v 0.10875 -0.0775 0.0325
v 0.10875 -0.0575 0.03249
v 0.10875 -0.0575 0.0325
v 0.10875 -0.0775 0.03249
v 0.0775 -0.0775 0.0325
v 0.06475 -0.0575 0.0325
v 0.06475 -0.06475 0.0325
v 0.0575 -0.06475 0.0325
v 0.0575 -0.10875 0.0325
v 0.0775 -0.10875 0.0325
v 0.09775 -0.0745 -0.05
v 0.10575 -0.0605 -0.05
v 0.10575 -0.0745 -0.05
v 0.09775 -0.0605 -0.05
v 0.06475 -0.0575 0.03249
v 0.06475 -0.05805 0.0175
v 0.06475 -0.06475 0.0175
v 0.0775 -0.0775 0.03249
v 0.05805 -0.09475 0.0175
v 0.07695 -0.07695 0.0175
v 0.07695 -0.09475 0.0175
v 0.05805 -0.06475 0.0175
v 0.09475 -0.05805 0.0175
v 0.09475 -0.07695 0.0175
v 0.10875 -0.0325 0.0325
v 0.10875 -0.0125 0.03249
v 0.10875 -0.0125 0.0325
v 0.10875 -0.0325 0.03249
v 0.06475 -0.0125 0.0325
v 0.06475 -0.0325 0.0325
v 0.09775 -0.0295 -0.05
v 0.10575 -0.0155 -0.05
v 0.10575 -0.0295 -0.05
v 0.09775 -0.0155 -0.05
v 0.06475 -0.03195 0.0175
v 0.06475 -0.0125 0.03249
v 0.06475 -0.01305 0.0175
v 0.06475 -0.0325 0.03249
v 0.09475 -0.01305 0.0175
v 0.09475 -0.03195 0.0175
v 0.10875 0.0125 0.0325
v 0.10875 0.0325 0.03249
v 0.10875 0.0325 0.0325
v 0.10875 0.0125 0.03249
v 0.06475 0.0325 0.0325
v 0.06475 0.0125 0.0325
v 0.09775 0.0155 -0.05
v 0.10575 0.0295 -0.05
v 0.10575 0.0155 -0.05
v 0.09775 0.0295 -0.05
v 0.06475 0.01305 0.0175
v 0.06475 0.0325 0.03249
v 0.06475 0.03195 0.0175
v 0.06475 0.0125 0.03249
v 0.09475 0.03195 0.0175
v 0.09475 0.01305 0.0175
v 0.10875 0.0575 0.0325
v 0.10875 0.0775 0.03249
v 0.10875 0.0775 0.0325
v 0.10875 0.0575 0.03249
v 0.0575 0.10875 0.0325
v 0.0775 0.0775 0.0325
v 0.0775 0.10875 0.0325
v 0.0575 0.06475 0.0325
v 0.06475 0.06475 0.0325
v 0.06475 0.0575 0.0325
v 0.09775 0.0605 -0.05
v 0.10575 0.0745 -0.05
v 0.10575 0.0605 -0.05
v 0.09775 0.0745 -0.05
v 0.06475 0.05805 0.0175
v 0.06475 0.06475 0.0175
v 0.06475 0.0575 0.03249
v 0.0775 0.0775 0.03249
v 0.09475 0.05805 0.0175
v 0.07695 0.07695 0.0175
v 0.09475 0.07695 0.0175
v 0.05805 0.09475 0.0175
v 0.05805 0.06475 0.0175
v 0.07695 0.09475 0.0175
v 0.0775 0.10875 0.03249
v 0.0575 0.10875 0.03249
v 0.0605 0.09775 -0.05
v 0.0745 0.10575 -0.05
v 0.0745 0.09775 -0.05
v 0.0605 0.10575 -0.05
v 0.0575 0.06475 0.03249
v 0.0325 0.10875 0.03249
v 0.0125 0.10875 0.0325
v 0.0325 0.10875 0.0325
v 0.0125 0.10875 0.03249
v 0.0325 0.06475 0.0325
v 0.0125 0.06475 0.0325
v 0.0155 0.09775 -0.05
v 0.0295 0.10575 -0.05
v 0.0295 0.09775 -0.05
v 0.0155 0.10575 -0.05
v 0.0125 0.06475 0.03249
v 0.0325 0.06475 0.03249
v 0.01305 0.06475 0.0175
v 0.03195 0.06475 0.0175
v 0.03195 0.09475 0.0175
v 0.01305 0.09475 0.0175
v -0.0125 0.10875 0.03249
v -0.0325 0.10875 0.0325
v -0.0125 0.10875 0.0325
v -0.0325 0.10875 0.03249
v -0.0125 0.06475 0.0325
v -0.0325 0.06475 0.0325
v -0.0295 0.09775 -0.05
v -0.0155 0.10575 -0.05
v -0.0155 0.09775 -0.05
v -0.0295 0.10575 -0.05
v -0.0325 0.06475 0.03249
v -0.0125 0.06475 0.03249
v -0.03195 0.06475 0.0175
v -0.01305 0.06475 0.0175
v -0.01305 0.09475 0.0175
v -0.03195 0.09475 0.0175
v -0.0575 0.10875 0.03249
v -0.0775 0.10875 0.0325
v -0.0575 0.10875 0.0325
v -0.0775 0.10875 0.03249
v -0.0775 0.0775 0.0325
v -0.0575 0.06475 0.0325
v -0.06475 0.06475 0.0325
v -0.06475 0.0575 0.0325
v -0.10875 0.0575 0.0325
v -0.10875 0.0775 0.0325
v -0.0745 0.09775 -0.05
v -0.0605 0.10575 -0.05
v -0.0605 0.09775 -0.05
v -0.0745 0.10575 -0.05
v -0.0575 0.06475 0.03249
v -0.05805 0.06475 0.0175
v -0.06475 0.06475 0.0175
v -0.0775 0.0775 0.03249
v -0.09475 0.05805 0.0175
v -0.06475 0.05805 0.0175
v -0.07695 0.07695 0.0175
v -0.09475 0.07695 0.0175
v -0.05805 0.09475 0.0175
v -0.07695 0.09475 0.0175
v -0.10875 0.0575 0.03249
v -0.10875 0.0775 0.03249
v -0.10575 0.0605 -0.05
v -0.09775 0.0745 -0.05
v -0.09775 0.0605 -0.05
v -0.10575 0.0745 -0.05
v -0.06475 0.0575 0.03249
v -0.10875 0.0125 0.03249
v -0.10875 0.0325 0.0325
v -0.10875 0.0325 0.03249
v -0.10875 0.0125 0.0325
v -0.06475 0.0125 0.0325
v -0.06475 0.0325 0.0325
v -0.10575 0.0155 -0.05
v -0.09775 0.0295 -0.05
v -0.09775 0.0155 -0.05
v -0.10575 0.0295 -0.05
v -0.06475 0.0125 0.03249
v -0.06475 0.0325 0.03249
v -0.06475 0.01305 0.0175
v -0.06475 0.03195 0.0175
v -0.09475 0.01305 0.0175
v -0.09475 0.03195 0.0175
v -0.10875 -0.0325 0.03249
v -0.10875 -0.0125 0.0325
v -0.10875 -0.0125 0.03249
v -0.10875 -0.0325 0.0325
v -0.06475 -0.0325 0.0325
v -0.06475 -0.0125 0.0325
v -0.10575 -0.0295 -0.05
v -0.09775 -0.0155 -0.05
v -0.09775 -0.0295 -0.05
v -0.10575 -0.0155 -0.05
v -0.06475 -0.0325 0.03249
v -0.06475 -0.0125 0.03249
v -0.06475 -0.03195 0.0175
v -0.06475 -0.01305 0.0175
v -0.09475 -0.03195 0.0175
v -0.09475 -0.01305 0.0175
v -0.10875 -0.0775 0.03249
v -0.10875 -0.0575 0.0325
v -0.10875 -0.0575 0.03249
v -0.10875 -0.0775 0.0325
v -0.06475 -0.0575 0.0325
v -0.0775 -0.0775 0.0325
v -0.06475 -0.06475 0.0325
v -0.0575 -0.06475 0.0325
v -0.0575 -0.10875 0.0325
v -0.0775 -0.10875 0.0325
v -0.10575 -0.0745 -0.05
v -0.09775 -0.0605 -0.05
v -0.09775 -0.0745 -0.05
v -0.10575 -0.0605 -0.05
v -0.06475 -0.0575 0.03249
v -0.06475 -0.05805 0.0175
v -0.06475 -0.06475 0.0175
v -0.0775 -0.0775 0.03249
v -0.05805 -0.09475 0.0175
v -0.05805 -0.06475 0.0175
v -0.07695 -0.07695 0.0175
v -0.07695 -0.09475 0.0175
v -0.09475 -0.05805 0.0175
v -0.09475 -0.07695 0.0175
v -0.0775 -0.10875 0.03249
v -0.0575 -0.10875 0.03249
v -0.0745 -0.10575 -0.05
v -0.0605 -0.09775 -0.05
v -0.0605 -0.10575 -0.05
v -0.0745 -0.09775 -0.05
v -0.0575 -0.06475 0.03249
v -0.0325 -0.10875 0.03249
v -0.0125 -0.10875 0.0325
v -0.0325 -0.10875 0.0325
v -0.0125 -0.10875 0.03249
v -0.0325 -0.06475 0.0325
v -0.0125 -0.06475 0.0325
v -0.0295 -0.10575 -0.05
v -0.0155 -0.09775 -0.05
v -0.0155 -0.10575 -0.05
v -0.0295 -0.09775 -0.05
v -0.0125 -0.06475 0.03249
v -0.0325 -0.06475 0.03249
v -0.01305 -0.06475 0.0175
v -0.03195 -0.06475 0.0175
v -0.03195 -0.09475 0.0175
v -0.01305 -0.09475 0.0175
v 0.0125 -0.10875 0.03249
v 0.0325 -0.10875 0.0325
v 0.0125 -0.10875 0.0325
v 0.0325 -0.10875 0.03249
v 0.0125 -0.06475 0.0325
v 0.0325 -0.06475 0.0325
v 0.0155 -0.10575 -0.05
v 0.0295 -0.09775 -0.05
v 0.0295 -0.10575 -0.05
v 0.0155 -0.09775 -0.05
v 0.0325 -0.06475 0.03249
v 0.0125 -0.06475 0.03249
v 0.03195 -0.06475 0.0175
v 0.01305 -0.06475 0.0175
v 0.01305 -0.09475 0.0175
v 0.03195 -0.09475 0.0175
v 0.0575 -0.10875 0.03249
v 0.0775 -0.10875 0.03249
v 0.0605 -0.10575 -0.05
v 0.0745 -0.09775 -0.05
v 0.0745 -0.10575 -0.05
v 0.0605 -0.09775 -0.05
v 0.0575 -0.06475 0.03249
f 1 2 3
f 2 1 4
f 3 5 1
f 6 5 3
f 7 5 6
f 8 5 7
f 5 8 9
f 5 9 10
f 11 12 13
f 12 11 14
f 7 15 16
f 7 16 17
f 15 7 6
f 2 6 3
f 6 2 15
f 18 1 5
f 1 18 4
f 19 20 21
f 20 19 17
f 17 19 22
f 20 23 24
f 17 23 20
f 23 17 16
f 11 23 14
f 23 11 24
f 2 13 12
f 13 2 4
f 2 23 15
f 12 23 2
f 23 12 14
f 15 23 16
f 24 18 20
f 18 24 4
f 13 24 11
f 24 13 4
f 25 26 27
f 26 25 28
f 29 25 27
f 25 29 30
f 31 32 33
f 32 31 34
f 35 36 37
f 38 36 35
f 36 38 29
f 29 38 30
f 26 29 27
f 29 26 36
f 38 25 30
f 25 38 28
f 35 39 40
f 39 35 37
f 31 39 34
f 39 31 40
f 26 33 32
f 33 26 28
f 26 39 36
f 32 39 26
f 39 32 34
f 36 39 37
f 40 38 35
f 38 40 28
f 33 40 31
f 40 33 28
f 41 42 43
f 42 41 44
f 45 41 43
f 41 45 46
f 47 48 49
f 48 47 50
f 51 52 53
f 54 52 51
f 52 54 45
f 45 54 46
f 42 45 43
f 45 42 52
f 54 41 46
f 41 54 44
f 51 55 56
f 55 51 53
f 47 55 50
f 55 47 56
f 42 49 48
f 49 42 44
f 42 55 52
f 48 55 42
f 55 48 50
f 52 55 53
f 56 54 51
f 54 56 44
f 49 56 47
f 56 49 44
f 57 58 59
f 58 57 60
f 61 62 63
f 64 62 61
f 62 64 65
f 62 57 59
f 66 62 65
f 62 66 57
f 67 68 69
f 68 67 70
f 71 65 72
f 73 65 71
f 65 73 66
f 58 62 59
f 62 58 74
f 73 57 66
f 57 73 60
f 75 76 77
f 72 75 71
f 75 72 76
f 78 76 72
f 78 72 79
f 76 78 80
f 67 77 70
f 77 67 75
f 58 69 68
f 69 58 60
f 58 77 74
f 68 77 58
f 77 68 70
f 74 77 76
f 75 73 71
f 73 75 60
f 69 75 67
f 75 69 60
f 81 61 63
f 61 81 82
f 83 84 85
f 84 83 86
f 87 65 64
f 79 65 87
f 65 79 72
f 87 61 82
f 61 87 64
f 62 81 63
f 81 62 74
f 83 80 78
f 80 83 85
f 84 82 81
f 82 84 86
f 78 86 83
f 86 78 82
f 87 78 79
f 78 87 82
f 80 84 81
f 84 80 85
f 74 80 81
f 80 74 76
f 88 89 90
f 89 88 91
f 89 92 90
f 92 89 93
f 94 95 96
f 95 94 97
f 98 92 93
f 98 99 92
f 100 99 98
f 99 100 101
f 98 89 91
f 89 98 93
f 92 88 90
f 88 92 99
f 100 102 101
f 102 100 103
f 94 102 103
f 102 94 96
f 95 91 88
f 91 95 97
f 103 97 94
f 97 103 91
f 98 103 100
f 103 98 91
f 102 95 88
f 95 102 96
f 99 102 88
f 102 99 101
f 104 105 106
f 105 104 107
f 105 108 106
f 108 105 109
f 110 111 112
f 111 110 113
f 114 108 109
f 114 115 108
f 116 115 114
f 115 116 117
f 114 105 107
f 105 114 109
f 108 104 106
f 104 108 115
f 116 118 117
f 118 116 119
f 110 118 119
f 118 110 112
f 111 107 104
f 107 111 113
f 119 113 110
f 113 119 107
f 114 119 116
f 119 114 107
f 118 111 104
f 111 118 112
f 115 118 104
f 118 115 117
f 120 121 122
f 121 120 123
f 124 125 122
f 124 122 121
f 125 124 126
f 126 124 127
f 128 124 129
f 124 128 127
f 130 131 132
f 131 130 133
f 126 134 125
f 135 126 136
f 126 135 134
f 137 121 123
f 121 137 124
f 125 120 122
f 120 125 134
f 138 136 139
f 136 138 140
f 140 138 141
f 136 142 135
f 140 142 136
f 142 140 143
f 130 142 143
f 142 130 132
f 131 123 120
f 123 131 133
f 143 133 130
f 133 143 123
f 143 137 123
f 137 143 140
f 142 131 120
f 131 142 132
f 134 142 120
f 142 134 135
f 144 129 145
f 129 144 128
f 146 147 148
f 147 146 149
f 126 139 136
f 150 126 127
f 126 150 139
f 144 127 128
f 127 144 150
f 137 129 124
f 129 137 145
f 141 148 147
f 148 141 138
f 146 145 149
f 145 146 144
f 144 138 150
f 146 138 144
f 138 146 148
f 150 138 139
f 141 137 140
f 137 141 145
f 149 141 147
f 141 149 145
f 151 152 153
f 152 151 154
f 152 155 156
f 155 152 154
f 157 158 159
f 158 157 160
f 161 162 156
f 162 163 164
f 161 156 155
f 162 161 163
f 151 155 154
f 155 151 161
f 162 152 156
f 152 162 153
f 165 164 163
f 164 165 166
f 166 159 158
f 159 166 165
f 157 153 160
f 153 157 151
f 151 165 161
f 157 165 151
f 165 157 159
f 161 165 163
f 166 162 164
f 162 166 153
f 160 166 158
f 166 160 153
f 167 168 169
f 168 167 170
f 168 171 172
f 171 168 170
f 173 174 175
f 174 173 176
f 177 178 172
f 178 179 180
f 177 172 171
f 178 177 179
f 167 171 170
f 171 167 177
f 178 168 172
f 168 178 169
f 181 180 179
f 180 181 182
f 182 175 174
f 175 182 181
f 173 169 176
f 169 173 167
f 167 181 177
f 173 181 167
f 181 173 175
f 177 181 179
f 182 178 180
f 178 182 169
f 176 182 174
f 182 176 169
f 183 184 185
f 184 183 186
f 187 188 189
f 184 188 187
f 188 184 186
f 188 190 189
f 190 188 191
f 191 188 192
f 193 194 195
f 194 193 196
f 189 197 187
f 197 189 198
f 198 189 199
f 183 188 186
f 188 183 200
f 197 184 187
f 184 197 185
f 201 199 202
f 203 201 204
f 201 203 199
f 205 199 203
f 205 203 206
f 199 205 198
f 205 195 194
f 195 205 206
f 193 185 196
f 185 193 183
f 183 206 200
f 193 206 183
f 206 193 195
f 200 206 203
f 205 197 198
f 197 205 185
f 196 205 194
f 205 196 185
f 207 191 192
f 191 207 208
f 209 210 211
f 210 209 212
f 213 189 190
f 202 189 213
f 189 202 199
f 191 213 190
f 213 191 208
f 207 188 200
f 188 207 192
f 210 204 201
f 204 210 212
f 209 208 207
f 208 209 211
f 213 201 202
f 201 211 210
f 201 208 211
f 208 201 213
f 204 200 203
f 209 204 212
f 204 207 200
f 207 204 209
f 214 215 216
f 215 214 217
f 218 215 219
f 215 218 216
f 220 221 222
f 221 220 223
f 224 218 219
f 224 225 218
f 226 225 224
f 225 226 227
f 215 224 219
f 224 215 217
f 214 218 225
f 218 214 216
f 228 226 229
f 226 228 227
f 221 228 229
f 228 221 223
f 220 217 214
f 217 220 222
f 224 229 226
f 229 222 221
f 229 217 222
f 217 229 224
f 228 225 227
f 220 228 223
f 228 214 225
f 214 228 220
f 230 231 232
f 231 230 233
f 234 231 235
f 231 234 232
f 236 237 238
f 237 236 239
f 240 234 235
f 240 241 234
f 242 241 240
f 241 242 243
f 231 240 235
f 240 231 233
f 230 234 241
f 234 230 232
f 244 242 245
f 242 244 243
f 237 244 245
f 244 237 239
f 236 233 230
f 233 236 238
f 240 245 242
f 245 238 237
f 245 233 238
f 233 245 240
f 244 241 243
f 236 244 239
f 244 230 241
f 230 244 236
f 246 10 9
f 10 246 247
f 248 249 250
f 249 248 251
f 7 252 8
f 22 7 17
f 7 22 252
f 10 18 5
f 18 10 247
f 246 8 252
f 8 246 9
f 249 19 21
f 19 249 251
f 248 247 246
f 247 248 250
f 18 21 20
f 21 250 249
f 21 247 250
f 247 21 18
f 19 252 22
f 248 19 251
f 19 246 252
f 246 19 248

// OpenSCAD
// file: DataSymbol.scad
boxSize = 0.029;
lineSize = 0.0045;
symDepth = 0.01;
vertSeparation = 0.019;
horizSeparation = 0.018;

module DataSymbol() {
  boxVertCenter = (boxSize+vertSeparation)/2;
  boxHorizCenter = (boxSize+horizSeparation)/2;
  linear_extrude(symDepth, center=true) {
    translate([0,boxVertCenter]) square(boxSize, center=true); // top box
    translate([-boxHorizCenter,-boxVertCenter]) square(boxSize, center=true); // bottom left box
    translate([boxHorizCenter,-boxVertCenter]) square(boxSize, center=true); // bottom right box
    square([2*boxHorizCenter + lineSize, lineSize], center=true); // middle line
    translate([0, horizSeparation/4]) square([lineSize, horizSeparation/2 + lineSize], center=true); // line to top
    translate([-boxHorizCenter, -horizSeparation/4]) square([lineSize, horizSeparation/2 + lineSize], center=true); // line to bottom left
    translate([boxHorizCenter, -horizSeparation/4]) square([lineSize, horizSeparation/2 + lineSize], center=true); // line to bottom right
  }
}

DataSymbol();
// file: PowerSymbol.scad
symWidth = 0.038;
symHeight = 0.086;
symDepth = 0.01;
middleHeight = 0.0075;
topHorizOffset = 0.007;
sideVertOffset = 0.007;

module PowerSymbol() {
  linear_extrude(symDepth, center=true) {
    halfHei = symHeight/2;
    halfWid = symWidth/2;
    halfMid = middleHeight/2;
    polygon([
      [topHorizOffset, halfHei],
      [0, halfMid],
      [halfWid, sideVertOffset],
      [-topHorizOffset, -halfHei],
      [0, -halfMid],
      [-halfWid, -sideVertOffset]
    ]);
  }
}

PowerSymbol();
// file: BasicFPGAHousing_paintcap.scad
include <FPGA_shared.scad>;
use <BasicFPGAHousing_base.scad>;

module BasicFPGAHousing_paintcap() {
  bevelDepth = capBevel * sqrt(2);
  difference() {
    translate([0,0,baseTop]) {
      cube(size=[capSize, capSize, capDepth*2], center=true);
    }
    cube(size=[slotSize+eps, slotSize+eps, smallGridSize], center=true);
    for (edge=[1:4]) rotate([0,0,90*edge]) {
      translate([0,capSize/2,baseTop+capDepth]) rotate([45,0,0])
        cube(size=[capSize+0.1, bevelDepth, bevelDepth*2], center=true);
    }
  }
}

%BasicFPGAHousing_base();
BasicFPGAHousing_paintcap();
// file: BasicFPGAHousing_base.scad
include <FPGA_shared.scad>;
use <BasicFPGAHousing_paintcap.scad>;
use <PowerSymbol.scad>;
use <DataSymbol.scad>;

module BasiFPGAHousing_chipcutout() {
  slotPinBaseOffset = (-slotPinEdgeCount-1)/2 * slotPinEdgeSpacing;
  slotPinEdgeOffset = slotSize/2 - slotPinSize/2 - slotPinEdgePad;
  union() {
    translate([0, 0, baseDepth/2 + slotBottom + slotPinDepth]) {
      cube(size=[slotSize, slotSize, baseDepth], center=true);
    }
    for(edge=[1:4]) rotate([0,0,90*edge]) {
      for(i=[1:slotPinEdgeCount]) {
        translate([
          slotPinBaseOffset + slotPinEdgeSpacing*i,
          slotPinEdgeOffset,
          slotBottom + slotPinDepth
        ]) {
          cube(size=[slotPinSize, slotPinSize, slotPinDepth*2], center=true);
        }
      }
    }
    translate([alignHoleOffset,alignHoleOffset,slotBottom + slotPinDepth])
      cylinder(h=alignHoleDepth*2, r=alignHoleRadius, center=true, $fn=alignHoleSides);
  }
}

module BasicFPGAHousing_base() {
  middleSize = (slotSize + capSize) / 2;
  difference() {
    union() {
      translate([0,0,baseCenter])
        cube(size=[baseSize, baseSize, baseDepth], center=true);
      translate([0,0,baseTop-eps])
        cube(size=[middleSize, middleSize, capDepth*2], center=true);
    }
    translate([0,0,baseBottom])
      cube(size=[baseBackCutoutSize, baseBackCutoutSize, baseBackCutoutDepth*2], center=true);
    BasiFPGAHousing_chipcutout();
    cablecutout();
    rotate([0,0,180]) cablecutout();
  }
}

BasicFPGAHousing_base();
%BasicFPGAHousing_paintcap();
%translate([0.067,0.25,-0.001]) rotate([-90, 0, 0]) PowerSymbol();
%translate([0.073,-0.25,0.001]) rotate([90, 0, 0]) DataSymbol();
// file: BasicFPGAHousing_full.scad
use <BasicFPGAHousing_base.scad>;
use <BasicFPGAHousing_paintcap.scad>;
use <PowerSymbol.scad>;
use <DataSymbol.scad>;

module BasicFPGAHousing_full() {
  BasicFPGAHousing_base();
  BasicFPGAHousing_paintcap();
  translate([0.067,0.25,-0.001]) rotate([-90, 0, 0]) PowerSymbol();
  translate([0.073,-0.25,0.001]) rotate([90, 0, 0]) DataSymbol();
}

BasicFPGAHousing_full();
// file: BasicFPGAChip_base.scad
include <FPGA_shared.scad>;
use <BasicFPGAHousing_full.scad>;
use <BasicFPGAChip_pins.scad>;

module BasicFPGAChip_base() {
  bevelHeight = (chipBaseHeight - pinHorizHeight)/2;
  bevelAngle = atan2(chipBaseBevelSize, bevelHeight);
  translate([0, 0, chipTotalHeight/2 - chipBaseHeight/2]) difference() {
    cube(size=[chipBaseSize, chipBaseSize, chipBaseHeight], center=true);
    for (side=[0:3]) rotate([0,0,90*side])
      for (vside = [-1:2:1])
        translate([0,chipBaseSize/2,vside*pinHorizHeight/2])
          rotate([vside*bevelAngle,0,0])
          translate([0,chipBaseBevelSize,0])
            cube(size=[chipBaseSize*2,chipBaseBevelSize*2,bevelHeight*4], center=true);
    translate([alignHoleOffset,alignHoleOffset,chipBaseHeight/2])
      cylinder(h=alignHoleDepth*2, r=alignHoleRadius, center=true, $fn=alignHoleSides);
  }
}

BasicFPGAChip_base();
%BasicFPGAChip_pins();
*%translate([0,0,-slotBottom-chipTotalHeight/2]) BasicFPGAHousing_full();
// file: FPGA_shared.scad
smallGridSize = 0.5;
baseSize = smallGridSize;
baseTop = 0.05;
baseBottom = -0.045;
baseDepth = baseTop - baseBottom;
baseCenter = (baseTop + baseBottom)/2;
baseBackRim = 0.02;
baseBackCutoutSize = baseSize - baseBackRim*2;
baseBackCutoutDepth = 0.01;
capSize = 0.41;
capDepth = 0.045;
capBevel = 0.01;
slotSize = smallGridSize * 0.5;
slotBottom = 0.03;
slotPinEdgeCount = 4;
slotPinEdgePad = 0.01;
slotPinEdgeSpacing = 0.045;
slotPinSize = 0.025;
slotPinDepth = 0.025;
eps = 0.00001;
chipTotalSize = slotSize - slotPinEdgePad*2 - slotPinSize/2;
chipTotalHeight = 0.1;
chipBaseHeight = 0.05;
pinHorizLength = 0.022;
pinHorizUnderLength = 0.008;
pinHorizWidth = 0.02;
pinHorizHeight = 0.015;
pinVertInnerOffset = 0.003;
pinVertOuterOffset = 0.003;
pinVertNarrowOffset = 0.003;
pinTotalHeight = chipTotalHeight - chipBaseHeight/2 + pinHorizHeight/2;
chipBaseSize = chipTotalSize - pinHorizLength*2;
chipBaseBevelSize = 0.005;
alignHoleRadius = 0.005;
alignHoleOffset = chipBaseSize/2 - 0.02;
alignHoleDepth = 0.005;
alignHoleSides = 8;

module cablecutout() {
  cableradius = 0.025;
  cableDepth = 0.0125;
  translate([0,smallGridSize/2,0]) rotate([90,0,0]) {
    cylinder(h=cableDepth*2, r=cableradius, center=true, $fn=8);
  }
}
// main file
include <FPGA_shared.scad>;
use <BasicFPGAChip_base.scad>;

module FPGAPin() {
  pinTop = chipTotalHeight/2 - chipBaseHeight/2 + pinHorizHeight/2;
  pinVCenter = pinTop - pinTotalHeight/2;
  pinBottomInnerEdge = pinHorizUnderLength + pinVertInnerOffset;
  pinInnerHeight = pinTotalHeight - pinHorizHeight;
  pinInnerAngle = atan2(-pinVertInnerOffset, pinInnerHeight);
  pinInnerCutoutHeight = pinInnerHeight / cos(pinInnerAngle);
  pinBottomOuterEdge = pinHorizLength - pinVertOuterOffset;
  pinOuterAngle = atan2(pinVertOuterOffset, pinTotalHeight);
  pinBottomNarrowEdge = pinHorizWidth/2 - pinVertNarrowOffset;
  pinNarrowAngle = atan2(pinVertNarrowOffset, pinTotalHeight);
  translate([0,0,pinVCenter]) difference() {
    translate([0, 0, 0])
      cube(size=[pinHorizLength*2, pinHorizWidth, pinTotalHeight], center=true);
    translate([pinHorizUnderLength-pinHorizLength, 0, -pinHorizHeight])
      cube(size=[pinHorizLength*2, pinHorizWidth*2, pinTotalHeight], center=true);
    translate([pinBottomInnerEdge,0,-pinHorizHeight/2-pinInnerHeight/2])
      rotate([0,pinInnerAngle,0])
      translate([-pinVertInnerOffset,0,0])
        cube(size=[pinVertInnerOffset*2, pinHorizWidth*2, pinInnerCutoutHeight*2], center=true);
    translate([pinBottomOuterEdge,0,-pinTotalHeight/2])
      rotate([0,pinOuterAngle,0])
      translate([pinVertOuterOffset,0,0])
        cube(size=[pinVertOuterOffset*2, pinHorizWidth*2, pinTotalHeight*4], center=true);
    translate([0,pinBottomNarrowEdge,-pinTotalHeight/2])
      rotate([-pinNarrowAngle,0,0])
      translate([0,pinVertNarrowOffset,0])
        cube(size=[pinHorizLength*4,pinVertNarrowOffset*2, pinTotalHeight*4], center=true);
    translate([0,-pinBottomNarrowEdge,-pinTotalHeight/2])
      rotate([pinNarrowAngle,0,0])
      translate([0,-pinVertNarrowOffset,0])
        cube(size=[pinHorizLength*4,pinVertNarrowOffset*2, pinTotalHeight*4], center=true);
  }
}

module BasicFPGAChip_pins() {
  for (edge=[0:3])
    for (off=[1:slotPinEdgeCount])
      rotate([0,0,90*edge])
        translate([chipBaseSize/2, slotPinEdgeSpacing * (off - (slotPinEdgeCount+1)/2), 0])
        FPGAPin();
}

BasicFPGAChip_pins();
%BasicFPGAChip_base();
